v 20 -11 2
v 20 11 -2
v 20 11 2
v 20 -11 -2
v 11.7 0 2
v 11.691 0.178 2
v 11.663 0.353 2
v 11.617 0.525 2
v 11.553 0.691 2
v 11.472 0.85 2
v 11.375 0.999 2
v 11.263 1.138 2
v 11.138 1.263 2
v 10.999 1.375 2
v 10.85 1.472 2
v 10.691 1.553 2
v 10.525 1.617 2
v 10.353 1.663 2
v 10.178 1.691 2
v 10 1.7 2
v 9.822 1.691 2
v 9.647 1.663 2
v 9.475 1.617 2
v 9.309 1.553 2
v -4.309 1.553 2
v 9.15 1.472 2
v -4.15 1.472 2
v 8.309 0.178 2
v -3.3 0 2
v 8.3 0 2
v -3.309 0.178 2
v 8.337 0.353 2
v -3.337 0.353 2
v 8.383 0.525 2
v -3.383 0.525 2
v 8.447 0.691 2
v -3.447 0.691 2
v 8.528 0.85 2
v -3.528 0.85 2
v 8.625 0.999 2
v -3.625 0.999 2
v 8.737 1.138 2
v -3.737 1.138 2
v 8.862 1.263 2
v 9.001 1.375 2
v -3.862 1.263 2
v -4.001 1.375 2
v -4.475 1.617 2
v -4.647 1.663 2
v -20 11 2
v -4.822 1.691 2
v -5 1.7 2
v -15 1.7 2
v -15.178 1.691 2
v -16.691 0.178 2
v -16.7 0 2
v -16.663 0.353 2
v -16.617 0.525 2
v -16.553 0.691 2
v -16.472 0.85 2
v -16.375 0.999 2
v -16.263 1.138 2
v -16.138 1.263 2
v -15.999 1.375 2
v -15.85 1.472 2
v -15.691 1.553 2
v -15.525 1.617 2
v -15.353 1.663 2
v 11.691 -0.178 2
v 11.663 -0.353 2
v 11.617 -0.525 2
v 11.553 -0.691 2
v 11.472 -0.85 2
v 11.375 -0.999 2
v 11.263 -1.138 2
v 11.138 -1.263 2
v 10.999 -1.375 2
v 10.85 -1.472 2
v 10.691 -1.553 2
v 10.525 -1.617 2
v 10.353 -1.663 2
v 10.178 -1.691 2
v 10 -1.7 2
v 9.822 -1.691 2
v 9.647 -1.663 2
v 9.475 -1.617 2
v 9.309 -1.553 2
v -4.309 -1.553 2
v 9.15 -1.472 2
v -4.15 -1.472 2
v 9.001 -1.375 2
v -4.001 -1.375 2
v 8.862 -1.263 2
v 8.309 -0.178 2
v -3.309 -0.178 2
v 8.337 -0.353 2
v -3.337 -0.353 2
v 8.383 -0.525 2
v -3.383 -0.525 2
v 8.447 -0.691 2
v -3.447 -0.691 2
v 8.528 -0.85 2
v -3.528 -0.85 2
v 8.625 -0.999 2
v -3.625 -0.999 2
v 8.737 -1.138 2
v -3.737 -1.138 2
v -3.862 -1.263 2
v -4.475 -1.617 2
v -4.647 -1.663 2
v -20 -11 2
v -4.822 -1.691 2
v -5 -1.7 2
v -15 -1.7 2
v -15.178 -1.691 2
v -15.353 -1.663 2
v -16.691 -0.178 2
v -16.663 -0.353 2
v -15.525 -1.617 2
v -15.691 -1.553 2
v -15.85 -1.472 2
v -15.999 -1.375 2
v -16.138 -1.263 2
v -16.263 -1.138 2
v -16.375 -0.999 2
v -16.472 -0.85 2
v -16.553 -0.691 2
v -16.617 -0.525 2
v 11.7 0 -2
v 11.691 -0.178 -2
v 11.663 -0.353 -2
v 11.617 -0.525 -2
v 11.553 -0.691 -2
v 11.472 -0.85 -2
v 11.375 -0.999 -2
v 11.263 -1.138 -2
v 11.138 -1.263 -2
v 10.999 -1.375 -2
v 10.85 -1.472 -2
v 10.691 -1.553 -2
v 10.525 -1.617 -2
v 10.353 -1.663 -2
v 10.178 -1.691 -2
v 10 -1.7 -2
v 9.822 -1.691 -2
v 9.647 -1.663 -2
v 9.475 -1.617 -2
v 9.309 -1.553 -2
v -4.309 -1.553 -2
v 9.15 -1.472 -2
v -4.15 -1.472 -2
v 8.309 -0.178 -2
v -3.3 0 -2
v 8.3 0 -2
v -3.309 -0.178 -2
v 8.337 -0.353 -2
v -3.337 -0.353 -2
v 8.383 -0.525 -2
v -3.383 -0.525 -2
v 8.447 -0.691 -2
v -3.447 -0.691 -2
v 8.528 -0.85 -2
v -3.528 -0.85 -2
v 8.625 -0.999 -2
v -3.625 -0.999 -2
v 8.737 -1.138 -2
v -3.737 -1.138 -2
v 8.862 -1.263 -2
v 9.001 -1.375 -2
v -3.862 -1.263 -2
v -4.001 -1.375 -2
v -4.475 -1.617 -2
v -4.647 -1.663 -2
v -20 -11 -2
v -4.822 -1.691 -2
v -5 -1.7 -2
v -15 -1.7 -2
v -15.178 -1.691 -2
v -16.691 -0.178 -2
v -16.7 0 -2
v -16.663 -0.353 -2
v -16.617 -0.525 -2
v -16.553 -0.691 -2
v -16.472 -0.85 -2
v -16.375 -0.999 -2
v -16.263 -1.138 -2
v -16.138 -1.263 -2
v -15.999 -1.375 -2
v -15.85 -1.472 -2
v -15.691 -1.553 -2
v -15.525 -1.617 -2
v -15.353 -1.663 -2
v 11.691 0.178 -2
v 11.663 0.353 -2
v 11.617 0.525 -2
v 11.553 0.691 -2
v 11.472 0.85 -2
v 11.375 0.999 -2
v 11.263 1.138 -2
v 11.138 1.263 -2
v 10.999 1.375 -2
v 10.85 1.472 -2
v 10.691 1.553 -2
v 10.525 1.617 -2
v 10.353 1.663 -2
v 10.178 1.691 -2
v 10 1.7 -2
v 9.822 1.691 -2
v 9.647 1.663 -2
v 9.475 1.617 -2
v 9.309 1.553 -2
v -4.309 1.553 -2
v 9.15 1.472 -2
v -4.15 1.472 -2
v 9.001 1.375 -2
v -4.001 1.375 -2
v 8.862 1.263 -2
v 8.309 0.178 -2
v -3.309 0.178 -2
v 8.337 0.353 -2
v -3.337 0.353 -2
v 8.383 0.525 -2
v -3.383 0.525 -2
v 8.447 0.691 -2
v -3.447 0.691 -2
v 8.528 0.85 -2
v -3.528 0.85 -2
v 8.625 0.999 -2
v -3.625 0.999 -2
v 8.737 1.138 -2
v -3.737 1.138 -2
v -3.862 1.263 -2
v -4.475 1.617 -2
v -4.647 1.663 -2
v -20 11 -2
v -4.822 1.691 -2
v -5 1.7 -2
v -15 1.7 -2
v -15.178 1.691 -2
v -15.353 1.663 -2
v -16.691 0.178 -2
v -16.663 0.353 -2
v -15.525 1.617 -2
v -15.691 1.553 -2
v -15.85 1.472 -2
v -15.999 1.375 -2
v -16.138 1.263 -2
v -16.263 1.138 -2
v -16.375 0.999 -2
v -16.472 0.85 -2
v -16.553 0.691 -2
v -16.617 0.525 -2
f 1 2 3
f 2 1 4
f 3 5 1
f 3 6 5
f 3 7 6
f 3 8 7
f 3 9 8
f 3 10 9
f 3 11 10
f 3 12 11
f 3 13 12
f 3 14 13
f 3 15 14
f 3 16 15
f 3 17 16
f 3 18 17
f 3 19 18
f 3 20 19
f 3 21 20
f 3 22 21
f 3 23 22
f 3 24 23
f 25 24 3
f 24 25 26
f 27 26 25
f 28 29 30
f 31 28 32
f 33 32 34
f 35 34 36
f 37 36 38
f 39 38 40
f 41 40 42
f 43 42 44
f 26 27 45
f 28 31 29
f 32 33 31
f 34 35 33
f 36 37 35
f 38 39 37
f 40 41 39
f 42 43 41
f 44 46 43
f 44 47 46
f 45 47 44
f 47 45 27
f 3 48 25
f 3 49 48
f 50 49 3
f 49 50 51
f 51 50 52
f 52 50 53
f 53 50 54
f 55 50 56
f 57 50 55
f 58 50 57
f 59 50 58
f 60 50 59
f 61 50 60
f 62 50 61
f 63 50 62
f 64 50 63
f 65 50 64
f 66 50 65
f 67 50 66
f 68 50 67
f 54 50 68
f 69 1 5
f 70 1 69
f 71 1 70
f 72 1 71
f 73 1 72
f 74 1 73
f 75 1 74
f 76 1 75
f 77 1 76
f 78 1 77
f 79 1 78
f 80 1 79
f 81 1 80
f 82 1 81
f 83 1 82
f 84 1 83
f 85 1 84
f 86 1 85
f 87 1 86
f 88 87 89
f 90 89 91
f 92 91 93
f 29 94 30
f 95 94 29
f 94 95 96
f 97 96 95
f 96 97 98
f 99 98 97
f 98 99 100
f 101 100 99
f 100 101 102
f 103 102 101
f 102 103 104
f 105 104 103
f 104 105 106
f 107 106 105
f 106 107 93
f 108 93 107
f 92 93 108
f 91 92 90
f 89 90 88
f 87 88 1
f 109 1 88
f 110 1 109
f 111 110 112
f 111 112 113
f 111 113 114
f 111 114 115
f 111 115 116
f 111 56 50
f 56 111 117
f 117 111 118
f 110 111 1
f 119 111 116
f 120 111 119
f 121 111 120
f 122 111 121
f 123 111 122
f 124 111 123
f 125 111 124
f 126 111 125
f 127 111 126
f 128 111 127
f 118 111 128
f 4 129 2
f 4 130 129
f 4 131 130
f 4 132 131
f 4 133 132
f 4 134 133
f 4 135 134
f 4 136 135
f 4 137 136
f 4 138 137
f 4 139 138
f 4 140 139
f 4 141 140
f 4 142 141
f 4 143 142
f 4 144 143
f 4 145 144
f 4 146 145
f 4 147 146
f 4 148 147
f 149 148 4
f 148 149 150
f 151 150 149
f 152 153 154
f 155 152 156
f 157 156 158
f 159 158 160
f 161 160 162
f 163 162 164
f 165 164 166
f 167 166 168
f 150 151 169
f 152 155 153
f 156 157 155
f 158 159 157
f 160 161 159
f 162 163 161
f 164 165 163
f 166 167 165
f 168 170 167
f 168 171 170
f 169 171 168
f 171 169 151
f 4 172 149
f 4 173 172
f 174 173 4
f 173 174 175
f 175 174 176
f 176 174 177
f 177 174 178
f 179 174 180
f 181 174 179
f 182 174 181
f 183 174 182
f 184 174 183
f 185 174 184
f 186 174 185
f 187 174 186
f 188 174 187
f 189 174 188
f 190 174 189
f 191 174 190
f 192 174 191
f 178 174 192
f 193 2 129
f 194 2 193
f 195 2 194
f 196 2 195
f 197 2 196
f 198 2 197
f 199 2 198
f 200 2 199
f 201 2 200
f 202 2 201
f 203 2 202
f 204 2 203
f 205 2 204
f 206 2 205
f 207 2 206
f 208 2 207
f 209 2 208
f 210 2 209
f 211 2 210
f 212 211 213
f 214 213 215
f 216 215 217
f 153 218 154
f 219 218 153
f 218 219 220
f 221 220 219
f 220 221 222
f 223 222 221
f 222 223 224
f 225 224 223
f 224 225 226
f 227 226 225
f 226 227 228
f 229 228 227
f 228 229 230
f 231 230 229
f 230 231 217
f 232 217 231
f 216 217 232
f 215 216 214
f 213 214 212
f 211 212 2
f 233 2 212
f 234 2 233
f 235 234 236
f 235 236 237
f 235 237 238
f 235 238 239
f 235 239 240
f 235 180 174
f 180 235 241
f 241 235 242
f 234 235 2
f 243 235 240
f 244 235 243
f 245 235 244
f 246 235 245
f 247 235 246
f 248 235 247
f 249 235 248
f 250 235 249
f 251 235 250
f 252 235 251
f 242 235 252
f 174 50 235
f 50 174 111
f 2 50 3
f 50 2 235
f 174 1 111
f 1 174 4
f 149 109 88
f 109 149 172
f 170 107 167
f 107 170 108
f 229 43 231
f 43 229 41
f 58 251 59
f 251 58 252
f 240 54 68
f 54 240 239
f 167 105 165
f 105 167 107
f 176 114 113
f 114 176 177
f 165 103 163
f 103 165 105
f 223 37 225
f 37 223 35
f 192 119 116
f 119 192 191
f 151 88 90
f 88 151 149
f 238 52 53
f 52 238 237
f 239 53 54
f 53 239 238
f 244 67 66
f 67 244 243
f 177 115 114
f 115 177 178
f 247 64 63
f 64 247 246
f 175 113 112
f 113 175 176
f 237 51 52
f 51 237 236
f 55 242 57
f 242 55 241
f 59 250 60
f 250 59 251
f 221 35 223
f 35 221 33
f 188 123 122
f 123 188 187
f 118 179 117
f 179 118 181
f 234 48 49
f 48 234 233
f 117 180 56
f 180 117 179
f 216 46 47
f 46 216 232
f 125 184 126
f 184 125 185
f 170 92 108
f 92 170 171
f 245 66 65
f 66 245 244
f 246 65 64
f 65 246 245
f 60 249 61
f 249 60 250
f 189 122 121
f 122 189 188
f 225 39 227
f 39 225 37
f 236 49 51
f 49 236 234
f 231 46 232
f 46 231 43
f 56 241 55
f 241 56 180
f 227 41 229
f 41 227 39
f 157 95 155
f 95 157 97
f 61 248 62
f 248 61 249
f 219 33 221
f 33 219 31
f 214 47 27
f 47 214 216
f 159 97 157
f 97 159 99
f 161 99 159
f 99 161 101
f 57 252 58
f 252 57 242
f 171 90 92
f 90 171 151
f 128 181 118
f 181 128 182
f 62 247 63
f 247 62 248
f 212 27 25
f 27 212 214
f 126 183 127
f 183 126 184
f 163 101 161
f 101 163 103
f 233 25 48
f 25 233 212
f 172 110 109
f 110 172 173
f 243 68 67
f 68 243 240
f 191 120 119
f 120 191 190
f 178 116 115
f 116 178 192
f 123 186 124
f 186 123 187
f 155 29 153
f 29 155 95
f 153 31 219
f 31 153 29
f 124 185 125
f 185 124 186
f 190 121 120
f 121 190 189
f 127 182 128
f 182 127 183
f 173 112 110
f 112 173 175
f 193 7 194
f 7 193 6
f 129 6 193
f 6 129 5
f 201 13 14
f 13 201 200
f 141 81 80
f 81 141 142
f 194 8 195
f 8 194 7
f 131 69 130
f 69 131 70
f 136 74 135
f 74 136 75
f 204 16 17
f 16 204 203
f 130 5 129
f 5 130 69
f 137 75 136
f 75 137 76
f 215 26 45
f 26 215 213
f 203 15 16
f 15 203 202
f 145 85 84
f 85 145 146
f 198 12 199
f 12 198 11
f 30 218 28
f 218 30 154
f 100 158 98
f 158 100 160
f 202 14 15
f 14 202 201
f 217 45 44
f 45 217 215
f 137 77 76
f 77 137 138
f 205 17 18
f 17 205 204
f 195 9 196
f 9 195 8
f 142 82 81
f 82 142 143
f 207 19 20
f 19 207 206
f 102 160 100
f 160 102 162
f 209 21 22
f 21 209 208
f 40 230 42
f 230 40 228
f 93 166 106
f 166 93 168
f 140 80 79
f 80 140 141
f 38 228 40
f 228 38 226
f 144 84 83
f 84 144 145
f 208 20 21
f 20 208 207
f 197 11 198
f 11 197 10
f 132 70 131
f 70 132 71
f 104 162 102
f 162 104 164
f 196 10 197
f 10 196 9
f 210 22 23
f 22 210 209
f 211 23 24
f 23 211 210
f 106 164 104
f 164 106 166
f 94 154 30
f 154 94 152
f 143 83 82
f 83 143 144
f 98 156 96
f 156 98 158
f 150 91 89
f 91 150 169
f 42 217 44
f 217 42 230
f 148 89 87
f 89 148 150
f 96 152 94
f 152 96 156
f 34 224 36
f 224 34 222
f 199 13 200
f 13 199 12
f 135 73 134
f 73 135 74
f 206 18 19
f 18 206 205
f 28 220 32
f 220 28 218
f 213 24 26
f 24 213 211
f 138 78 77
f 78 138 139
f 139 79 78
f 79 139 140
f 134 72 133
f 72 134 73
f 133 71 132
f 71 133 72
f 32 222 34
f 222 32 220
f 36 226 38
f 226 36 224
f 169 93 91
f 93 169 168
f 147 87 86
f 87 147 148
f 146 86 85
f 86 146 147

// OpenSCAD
// Adjustable sensor mounting tab.
$fn = 60;
eps = 0.02;
length = 40;
width = 22;
thickness = 4;
slot_l = 10;
module slot(x) { hull() { translate([x-slot_l/2,0,-thickness/2-eps]) cylinder(d=3.4,h=thickness+2*eps); translate([x+slot_l/2,0,-thickness/2-eps]) cylinder(d=3.4,h=thickness+2*eps); } }
difference() { cube([length,width,thickness],center=true); slot(-length/4); translate([length/4,0,-thickness/2-eps]) cylinder(d=3.4,h=thickness+2*eps); }
